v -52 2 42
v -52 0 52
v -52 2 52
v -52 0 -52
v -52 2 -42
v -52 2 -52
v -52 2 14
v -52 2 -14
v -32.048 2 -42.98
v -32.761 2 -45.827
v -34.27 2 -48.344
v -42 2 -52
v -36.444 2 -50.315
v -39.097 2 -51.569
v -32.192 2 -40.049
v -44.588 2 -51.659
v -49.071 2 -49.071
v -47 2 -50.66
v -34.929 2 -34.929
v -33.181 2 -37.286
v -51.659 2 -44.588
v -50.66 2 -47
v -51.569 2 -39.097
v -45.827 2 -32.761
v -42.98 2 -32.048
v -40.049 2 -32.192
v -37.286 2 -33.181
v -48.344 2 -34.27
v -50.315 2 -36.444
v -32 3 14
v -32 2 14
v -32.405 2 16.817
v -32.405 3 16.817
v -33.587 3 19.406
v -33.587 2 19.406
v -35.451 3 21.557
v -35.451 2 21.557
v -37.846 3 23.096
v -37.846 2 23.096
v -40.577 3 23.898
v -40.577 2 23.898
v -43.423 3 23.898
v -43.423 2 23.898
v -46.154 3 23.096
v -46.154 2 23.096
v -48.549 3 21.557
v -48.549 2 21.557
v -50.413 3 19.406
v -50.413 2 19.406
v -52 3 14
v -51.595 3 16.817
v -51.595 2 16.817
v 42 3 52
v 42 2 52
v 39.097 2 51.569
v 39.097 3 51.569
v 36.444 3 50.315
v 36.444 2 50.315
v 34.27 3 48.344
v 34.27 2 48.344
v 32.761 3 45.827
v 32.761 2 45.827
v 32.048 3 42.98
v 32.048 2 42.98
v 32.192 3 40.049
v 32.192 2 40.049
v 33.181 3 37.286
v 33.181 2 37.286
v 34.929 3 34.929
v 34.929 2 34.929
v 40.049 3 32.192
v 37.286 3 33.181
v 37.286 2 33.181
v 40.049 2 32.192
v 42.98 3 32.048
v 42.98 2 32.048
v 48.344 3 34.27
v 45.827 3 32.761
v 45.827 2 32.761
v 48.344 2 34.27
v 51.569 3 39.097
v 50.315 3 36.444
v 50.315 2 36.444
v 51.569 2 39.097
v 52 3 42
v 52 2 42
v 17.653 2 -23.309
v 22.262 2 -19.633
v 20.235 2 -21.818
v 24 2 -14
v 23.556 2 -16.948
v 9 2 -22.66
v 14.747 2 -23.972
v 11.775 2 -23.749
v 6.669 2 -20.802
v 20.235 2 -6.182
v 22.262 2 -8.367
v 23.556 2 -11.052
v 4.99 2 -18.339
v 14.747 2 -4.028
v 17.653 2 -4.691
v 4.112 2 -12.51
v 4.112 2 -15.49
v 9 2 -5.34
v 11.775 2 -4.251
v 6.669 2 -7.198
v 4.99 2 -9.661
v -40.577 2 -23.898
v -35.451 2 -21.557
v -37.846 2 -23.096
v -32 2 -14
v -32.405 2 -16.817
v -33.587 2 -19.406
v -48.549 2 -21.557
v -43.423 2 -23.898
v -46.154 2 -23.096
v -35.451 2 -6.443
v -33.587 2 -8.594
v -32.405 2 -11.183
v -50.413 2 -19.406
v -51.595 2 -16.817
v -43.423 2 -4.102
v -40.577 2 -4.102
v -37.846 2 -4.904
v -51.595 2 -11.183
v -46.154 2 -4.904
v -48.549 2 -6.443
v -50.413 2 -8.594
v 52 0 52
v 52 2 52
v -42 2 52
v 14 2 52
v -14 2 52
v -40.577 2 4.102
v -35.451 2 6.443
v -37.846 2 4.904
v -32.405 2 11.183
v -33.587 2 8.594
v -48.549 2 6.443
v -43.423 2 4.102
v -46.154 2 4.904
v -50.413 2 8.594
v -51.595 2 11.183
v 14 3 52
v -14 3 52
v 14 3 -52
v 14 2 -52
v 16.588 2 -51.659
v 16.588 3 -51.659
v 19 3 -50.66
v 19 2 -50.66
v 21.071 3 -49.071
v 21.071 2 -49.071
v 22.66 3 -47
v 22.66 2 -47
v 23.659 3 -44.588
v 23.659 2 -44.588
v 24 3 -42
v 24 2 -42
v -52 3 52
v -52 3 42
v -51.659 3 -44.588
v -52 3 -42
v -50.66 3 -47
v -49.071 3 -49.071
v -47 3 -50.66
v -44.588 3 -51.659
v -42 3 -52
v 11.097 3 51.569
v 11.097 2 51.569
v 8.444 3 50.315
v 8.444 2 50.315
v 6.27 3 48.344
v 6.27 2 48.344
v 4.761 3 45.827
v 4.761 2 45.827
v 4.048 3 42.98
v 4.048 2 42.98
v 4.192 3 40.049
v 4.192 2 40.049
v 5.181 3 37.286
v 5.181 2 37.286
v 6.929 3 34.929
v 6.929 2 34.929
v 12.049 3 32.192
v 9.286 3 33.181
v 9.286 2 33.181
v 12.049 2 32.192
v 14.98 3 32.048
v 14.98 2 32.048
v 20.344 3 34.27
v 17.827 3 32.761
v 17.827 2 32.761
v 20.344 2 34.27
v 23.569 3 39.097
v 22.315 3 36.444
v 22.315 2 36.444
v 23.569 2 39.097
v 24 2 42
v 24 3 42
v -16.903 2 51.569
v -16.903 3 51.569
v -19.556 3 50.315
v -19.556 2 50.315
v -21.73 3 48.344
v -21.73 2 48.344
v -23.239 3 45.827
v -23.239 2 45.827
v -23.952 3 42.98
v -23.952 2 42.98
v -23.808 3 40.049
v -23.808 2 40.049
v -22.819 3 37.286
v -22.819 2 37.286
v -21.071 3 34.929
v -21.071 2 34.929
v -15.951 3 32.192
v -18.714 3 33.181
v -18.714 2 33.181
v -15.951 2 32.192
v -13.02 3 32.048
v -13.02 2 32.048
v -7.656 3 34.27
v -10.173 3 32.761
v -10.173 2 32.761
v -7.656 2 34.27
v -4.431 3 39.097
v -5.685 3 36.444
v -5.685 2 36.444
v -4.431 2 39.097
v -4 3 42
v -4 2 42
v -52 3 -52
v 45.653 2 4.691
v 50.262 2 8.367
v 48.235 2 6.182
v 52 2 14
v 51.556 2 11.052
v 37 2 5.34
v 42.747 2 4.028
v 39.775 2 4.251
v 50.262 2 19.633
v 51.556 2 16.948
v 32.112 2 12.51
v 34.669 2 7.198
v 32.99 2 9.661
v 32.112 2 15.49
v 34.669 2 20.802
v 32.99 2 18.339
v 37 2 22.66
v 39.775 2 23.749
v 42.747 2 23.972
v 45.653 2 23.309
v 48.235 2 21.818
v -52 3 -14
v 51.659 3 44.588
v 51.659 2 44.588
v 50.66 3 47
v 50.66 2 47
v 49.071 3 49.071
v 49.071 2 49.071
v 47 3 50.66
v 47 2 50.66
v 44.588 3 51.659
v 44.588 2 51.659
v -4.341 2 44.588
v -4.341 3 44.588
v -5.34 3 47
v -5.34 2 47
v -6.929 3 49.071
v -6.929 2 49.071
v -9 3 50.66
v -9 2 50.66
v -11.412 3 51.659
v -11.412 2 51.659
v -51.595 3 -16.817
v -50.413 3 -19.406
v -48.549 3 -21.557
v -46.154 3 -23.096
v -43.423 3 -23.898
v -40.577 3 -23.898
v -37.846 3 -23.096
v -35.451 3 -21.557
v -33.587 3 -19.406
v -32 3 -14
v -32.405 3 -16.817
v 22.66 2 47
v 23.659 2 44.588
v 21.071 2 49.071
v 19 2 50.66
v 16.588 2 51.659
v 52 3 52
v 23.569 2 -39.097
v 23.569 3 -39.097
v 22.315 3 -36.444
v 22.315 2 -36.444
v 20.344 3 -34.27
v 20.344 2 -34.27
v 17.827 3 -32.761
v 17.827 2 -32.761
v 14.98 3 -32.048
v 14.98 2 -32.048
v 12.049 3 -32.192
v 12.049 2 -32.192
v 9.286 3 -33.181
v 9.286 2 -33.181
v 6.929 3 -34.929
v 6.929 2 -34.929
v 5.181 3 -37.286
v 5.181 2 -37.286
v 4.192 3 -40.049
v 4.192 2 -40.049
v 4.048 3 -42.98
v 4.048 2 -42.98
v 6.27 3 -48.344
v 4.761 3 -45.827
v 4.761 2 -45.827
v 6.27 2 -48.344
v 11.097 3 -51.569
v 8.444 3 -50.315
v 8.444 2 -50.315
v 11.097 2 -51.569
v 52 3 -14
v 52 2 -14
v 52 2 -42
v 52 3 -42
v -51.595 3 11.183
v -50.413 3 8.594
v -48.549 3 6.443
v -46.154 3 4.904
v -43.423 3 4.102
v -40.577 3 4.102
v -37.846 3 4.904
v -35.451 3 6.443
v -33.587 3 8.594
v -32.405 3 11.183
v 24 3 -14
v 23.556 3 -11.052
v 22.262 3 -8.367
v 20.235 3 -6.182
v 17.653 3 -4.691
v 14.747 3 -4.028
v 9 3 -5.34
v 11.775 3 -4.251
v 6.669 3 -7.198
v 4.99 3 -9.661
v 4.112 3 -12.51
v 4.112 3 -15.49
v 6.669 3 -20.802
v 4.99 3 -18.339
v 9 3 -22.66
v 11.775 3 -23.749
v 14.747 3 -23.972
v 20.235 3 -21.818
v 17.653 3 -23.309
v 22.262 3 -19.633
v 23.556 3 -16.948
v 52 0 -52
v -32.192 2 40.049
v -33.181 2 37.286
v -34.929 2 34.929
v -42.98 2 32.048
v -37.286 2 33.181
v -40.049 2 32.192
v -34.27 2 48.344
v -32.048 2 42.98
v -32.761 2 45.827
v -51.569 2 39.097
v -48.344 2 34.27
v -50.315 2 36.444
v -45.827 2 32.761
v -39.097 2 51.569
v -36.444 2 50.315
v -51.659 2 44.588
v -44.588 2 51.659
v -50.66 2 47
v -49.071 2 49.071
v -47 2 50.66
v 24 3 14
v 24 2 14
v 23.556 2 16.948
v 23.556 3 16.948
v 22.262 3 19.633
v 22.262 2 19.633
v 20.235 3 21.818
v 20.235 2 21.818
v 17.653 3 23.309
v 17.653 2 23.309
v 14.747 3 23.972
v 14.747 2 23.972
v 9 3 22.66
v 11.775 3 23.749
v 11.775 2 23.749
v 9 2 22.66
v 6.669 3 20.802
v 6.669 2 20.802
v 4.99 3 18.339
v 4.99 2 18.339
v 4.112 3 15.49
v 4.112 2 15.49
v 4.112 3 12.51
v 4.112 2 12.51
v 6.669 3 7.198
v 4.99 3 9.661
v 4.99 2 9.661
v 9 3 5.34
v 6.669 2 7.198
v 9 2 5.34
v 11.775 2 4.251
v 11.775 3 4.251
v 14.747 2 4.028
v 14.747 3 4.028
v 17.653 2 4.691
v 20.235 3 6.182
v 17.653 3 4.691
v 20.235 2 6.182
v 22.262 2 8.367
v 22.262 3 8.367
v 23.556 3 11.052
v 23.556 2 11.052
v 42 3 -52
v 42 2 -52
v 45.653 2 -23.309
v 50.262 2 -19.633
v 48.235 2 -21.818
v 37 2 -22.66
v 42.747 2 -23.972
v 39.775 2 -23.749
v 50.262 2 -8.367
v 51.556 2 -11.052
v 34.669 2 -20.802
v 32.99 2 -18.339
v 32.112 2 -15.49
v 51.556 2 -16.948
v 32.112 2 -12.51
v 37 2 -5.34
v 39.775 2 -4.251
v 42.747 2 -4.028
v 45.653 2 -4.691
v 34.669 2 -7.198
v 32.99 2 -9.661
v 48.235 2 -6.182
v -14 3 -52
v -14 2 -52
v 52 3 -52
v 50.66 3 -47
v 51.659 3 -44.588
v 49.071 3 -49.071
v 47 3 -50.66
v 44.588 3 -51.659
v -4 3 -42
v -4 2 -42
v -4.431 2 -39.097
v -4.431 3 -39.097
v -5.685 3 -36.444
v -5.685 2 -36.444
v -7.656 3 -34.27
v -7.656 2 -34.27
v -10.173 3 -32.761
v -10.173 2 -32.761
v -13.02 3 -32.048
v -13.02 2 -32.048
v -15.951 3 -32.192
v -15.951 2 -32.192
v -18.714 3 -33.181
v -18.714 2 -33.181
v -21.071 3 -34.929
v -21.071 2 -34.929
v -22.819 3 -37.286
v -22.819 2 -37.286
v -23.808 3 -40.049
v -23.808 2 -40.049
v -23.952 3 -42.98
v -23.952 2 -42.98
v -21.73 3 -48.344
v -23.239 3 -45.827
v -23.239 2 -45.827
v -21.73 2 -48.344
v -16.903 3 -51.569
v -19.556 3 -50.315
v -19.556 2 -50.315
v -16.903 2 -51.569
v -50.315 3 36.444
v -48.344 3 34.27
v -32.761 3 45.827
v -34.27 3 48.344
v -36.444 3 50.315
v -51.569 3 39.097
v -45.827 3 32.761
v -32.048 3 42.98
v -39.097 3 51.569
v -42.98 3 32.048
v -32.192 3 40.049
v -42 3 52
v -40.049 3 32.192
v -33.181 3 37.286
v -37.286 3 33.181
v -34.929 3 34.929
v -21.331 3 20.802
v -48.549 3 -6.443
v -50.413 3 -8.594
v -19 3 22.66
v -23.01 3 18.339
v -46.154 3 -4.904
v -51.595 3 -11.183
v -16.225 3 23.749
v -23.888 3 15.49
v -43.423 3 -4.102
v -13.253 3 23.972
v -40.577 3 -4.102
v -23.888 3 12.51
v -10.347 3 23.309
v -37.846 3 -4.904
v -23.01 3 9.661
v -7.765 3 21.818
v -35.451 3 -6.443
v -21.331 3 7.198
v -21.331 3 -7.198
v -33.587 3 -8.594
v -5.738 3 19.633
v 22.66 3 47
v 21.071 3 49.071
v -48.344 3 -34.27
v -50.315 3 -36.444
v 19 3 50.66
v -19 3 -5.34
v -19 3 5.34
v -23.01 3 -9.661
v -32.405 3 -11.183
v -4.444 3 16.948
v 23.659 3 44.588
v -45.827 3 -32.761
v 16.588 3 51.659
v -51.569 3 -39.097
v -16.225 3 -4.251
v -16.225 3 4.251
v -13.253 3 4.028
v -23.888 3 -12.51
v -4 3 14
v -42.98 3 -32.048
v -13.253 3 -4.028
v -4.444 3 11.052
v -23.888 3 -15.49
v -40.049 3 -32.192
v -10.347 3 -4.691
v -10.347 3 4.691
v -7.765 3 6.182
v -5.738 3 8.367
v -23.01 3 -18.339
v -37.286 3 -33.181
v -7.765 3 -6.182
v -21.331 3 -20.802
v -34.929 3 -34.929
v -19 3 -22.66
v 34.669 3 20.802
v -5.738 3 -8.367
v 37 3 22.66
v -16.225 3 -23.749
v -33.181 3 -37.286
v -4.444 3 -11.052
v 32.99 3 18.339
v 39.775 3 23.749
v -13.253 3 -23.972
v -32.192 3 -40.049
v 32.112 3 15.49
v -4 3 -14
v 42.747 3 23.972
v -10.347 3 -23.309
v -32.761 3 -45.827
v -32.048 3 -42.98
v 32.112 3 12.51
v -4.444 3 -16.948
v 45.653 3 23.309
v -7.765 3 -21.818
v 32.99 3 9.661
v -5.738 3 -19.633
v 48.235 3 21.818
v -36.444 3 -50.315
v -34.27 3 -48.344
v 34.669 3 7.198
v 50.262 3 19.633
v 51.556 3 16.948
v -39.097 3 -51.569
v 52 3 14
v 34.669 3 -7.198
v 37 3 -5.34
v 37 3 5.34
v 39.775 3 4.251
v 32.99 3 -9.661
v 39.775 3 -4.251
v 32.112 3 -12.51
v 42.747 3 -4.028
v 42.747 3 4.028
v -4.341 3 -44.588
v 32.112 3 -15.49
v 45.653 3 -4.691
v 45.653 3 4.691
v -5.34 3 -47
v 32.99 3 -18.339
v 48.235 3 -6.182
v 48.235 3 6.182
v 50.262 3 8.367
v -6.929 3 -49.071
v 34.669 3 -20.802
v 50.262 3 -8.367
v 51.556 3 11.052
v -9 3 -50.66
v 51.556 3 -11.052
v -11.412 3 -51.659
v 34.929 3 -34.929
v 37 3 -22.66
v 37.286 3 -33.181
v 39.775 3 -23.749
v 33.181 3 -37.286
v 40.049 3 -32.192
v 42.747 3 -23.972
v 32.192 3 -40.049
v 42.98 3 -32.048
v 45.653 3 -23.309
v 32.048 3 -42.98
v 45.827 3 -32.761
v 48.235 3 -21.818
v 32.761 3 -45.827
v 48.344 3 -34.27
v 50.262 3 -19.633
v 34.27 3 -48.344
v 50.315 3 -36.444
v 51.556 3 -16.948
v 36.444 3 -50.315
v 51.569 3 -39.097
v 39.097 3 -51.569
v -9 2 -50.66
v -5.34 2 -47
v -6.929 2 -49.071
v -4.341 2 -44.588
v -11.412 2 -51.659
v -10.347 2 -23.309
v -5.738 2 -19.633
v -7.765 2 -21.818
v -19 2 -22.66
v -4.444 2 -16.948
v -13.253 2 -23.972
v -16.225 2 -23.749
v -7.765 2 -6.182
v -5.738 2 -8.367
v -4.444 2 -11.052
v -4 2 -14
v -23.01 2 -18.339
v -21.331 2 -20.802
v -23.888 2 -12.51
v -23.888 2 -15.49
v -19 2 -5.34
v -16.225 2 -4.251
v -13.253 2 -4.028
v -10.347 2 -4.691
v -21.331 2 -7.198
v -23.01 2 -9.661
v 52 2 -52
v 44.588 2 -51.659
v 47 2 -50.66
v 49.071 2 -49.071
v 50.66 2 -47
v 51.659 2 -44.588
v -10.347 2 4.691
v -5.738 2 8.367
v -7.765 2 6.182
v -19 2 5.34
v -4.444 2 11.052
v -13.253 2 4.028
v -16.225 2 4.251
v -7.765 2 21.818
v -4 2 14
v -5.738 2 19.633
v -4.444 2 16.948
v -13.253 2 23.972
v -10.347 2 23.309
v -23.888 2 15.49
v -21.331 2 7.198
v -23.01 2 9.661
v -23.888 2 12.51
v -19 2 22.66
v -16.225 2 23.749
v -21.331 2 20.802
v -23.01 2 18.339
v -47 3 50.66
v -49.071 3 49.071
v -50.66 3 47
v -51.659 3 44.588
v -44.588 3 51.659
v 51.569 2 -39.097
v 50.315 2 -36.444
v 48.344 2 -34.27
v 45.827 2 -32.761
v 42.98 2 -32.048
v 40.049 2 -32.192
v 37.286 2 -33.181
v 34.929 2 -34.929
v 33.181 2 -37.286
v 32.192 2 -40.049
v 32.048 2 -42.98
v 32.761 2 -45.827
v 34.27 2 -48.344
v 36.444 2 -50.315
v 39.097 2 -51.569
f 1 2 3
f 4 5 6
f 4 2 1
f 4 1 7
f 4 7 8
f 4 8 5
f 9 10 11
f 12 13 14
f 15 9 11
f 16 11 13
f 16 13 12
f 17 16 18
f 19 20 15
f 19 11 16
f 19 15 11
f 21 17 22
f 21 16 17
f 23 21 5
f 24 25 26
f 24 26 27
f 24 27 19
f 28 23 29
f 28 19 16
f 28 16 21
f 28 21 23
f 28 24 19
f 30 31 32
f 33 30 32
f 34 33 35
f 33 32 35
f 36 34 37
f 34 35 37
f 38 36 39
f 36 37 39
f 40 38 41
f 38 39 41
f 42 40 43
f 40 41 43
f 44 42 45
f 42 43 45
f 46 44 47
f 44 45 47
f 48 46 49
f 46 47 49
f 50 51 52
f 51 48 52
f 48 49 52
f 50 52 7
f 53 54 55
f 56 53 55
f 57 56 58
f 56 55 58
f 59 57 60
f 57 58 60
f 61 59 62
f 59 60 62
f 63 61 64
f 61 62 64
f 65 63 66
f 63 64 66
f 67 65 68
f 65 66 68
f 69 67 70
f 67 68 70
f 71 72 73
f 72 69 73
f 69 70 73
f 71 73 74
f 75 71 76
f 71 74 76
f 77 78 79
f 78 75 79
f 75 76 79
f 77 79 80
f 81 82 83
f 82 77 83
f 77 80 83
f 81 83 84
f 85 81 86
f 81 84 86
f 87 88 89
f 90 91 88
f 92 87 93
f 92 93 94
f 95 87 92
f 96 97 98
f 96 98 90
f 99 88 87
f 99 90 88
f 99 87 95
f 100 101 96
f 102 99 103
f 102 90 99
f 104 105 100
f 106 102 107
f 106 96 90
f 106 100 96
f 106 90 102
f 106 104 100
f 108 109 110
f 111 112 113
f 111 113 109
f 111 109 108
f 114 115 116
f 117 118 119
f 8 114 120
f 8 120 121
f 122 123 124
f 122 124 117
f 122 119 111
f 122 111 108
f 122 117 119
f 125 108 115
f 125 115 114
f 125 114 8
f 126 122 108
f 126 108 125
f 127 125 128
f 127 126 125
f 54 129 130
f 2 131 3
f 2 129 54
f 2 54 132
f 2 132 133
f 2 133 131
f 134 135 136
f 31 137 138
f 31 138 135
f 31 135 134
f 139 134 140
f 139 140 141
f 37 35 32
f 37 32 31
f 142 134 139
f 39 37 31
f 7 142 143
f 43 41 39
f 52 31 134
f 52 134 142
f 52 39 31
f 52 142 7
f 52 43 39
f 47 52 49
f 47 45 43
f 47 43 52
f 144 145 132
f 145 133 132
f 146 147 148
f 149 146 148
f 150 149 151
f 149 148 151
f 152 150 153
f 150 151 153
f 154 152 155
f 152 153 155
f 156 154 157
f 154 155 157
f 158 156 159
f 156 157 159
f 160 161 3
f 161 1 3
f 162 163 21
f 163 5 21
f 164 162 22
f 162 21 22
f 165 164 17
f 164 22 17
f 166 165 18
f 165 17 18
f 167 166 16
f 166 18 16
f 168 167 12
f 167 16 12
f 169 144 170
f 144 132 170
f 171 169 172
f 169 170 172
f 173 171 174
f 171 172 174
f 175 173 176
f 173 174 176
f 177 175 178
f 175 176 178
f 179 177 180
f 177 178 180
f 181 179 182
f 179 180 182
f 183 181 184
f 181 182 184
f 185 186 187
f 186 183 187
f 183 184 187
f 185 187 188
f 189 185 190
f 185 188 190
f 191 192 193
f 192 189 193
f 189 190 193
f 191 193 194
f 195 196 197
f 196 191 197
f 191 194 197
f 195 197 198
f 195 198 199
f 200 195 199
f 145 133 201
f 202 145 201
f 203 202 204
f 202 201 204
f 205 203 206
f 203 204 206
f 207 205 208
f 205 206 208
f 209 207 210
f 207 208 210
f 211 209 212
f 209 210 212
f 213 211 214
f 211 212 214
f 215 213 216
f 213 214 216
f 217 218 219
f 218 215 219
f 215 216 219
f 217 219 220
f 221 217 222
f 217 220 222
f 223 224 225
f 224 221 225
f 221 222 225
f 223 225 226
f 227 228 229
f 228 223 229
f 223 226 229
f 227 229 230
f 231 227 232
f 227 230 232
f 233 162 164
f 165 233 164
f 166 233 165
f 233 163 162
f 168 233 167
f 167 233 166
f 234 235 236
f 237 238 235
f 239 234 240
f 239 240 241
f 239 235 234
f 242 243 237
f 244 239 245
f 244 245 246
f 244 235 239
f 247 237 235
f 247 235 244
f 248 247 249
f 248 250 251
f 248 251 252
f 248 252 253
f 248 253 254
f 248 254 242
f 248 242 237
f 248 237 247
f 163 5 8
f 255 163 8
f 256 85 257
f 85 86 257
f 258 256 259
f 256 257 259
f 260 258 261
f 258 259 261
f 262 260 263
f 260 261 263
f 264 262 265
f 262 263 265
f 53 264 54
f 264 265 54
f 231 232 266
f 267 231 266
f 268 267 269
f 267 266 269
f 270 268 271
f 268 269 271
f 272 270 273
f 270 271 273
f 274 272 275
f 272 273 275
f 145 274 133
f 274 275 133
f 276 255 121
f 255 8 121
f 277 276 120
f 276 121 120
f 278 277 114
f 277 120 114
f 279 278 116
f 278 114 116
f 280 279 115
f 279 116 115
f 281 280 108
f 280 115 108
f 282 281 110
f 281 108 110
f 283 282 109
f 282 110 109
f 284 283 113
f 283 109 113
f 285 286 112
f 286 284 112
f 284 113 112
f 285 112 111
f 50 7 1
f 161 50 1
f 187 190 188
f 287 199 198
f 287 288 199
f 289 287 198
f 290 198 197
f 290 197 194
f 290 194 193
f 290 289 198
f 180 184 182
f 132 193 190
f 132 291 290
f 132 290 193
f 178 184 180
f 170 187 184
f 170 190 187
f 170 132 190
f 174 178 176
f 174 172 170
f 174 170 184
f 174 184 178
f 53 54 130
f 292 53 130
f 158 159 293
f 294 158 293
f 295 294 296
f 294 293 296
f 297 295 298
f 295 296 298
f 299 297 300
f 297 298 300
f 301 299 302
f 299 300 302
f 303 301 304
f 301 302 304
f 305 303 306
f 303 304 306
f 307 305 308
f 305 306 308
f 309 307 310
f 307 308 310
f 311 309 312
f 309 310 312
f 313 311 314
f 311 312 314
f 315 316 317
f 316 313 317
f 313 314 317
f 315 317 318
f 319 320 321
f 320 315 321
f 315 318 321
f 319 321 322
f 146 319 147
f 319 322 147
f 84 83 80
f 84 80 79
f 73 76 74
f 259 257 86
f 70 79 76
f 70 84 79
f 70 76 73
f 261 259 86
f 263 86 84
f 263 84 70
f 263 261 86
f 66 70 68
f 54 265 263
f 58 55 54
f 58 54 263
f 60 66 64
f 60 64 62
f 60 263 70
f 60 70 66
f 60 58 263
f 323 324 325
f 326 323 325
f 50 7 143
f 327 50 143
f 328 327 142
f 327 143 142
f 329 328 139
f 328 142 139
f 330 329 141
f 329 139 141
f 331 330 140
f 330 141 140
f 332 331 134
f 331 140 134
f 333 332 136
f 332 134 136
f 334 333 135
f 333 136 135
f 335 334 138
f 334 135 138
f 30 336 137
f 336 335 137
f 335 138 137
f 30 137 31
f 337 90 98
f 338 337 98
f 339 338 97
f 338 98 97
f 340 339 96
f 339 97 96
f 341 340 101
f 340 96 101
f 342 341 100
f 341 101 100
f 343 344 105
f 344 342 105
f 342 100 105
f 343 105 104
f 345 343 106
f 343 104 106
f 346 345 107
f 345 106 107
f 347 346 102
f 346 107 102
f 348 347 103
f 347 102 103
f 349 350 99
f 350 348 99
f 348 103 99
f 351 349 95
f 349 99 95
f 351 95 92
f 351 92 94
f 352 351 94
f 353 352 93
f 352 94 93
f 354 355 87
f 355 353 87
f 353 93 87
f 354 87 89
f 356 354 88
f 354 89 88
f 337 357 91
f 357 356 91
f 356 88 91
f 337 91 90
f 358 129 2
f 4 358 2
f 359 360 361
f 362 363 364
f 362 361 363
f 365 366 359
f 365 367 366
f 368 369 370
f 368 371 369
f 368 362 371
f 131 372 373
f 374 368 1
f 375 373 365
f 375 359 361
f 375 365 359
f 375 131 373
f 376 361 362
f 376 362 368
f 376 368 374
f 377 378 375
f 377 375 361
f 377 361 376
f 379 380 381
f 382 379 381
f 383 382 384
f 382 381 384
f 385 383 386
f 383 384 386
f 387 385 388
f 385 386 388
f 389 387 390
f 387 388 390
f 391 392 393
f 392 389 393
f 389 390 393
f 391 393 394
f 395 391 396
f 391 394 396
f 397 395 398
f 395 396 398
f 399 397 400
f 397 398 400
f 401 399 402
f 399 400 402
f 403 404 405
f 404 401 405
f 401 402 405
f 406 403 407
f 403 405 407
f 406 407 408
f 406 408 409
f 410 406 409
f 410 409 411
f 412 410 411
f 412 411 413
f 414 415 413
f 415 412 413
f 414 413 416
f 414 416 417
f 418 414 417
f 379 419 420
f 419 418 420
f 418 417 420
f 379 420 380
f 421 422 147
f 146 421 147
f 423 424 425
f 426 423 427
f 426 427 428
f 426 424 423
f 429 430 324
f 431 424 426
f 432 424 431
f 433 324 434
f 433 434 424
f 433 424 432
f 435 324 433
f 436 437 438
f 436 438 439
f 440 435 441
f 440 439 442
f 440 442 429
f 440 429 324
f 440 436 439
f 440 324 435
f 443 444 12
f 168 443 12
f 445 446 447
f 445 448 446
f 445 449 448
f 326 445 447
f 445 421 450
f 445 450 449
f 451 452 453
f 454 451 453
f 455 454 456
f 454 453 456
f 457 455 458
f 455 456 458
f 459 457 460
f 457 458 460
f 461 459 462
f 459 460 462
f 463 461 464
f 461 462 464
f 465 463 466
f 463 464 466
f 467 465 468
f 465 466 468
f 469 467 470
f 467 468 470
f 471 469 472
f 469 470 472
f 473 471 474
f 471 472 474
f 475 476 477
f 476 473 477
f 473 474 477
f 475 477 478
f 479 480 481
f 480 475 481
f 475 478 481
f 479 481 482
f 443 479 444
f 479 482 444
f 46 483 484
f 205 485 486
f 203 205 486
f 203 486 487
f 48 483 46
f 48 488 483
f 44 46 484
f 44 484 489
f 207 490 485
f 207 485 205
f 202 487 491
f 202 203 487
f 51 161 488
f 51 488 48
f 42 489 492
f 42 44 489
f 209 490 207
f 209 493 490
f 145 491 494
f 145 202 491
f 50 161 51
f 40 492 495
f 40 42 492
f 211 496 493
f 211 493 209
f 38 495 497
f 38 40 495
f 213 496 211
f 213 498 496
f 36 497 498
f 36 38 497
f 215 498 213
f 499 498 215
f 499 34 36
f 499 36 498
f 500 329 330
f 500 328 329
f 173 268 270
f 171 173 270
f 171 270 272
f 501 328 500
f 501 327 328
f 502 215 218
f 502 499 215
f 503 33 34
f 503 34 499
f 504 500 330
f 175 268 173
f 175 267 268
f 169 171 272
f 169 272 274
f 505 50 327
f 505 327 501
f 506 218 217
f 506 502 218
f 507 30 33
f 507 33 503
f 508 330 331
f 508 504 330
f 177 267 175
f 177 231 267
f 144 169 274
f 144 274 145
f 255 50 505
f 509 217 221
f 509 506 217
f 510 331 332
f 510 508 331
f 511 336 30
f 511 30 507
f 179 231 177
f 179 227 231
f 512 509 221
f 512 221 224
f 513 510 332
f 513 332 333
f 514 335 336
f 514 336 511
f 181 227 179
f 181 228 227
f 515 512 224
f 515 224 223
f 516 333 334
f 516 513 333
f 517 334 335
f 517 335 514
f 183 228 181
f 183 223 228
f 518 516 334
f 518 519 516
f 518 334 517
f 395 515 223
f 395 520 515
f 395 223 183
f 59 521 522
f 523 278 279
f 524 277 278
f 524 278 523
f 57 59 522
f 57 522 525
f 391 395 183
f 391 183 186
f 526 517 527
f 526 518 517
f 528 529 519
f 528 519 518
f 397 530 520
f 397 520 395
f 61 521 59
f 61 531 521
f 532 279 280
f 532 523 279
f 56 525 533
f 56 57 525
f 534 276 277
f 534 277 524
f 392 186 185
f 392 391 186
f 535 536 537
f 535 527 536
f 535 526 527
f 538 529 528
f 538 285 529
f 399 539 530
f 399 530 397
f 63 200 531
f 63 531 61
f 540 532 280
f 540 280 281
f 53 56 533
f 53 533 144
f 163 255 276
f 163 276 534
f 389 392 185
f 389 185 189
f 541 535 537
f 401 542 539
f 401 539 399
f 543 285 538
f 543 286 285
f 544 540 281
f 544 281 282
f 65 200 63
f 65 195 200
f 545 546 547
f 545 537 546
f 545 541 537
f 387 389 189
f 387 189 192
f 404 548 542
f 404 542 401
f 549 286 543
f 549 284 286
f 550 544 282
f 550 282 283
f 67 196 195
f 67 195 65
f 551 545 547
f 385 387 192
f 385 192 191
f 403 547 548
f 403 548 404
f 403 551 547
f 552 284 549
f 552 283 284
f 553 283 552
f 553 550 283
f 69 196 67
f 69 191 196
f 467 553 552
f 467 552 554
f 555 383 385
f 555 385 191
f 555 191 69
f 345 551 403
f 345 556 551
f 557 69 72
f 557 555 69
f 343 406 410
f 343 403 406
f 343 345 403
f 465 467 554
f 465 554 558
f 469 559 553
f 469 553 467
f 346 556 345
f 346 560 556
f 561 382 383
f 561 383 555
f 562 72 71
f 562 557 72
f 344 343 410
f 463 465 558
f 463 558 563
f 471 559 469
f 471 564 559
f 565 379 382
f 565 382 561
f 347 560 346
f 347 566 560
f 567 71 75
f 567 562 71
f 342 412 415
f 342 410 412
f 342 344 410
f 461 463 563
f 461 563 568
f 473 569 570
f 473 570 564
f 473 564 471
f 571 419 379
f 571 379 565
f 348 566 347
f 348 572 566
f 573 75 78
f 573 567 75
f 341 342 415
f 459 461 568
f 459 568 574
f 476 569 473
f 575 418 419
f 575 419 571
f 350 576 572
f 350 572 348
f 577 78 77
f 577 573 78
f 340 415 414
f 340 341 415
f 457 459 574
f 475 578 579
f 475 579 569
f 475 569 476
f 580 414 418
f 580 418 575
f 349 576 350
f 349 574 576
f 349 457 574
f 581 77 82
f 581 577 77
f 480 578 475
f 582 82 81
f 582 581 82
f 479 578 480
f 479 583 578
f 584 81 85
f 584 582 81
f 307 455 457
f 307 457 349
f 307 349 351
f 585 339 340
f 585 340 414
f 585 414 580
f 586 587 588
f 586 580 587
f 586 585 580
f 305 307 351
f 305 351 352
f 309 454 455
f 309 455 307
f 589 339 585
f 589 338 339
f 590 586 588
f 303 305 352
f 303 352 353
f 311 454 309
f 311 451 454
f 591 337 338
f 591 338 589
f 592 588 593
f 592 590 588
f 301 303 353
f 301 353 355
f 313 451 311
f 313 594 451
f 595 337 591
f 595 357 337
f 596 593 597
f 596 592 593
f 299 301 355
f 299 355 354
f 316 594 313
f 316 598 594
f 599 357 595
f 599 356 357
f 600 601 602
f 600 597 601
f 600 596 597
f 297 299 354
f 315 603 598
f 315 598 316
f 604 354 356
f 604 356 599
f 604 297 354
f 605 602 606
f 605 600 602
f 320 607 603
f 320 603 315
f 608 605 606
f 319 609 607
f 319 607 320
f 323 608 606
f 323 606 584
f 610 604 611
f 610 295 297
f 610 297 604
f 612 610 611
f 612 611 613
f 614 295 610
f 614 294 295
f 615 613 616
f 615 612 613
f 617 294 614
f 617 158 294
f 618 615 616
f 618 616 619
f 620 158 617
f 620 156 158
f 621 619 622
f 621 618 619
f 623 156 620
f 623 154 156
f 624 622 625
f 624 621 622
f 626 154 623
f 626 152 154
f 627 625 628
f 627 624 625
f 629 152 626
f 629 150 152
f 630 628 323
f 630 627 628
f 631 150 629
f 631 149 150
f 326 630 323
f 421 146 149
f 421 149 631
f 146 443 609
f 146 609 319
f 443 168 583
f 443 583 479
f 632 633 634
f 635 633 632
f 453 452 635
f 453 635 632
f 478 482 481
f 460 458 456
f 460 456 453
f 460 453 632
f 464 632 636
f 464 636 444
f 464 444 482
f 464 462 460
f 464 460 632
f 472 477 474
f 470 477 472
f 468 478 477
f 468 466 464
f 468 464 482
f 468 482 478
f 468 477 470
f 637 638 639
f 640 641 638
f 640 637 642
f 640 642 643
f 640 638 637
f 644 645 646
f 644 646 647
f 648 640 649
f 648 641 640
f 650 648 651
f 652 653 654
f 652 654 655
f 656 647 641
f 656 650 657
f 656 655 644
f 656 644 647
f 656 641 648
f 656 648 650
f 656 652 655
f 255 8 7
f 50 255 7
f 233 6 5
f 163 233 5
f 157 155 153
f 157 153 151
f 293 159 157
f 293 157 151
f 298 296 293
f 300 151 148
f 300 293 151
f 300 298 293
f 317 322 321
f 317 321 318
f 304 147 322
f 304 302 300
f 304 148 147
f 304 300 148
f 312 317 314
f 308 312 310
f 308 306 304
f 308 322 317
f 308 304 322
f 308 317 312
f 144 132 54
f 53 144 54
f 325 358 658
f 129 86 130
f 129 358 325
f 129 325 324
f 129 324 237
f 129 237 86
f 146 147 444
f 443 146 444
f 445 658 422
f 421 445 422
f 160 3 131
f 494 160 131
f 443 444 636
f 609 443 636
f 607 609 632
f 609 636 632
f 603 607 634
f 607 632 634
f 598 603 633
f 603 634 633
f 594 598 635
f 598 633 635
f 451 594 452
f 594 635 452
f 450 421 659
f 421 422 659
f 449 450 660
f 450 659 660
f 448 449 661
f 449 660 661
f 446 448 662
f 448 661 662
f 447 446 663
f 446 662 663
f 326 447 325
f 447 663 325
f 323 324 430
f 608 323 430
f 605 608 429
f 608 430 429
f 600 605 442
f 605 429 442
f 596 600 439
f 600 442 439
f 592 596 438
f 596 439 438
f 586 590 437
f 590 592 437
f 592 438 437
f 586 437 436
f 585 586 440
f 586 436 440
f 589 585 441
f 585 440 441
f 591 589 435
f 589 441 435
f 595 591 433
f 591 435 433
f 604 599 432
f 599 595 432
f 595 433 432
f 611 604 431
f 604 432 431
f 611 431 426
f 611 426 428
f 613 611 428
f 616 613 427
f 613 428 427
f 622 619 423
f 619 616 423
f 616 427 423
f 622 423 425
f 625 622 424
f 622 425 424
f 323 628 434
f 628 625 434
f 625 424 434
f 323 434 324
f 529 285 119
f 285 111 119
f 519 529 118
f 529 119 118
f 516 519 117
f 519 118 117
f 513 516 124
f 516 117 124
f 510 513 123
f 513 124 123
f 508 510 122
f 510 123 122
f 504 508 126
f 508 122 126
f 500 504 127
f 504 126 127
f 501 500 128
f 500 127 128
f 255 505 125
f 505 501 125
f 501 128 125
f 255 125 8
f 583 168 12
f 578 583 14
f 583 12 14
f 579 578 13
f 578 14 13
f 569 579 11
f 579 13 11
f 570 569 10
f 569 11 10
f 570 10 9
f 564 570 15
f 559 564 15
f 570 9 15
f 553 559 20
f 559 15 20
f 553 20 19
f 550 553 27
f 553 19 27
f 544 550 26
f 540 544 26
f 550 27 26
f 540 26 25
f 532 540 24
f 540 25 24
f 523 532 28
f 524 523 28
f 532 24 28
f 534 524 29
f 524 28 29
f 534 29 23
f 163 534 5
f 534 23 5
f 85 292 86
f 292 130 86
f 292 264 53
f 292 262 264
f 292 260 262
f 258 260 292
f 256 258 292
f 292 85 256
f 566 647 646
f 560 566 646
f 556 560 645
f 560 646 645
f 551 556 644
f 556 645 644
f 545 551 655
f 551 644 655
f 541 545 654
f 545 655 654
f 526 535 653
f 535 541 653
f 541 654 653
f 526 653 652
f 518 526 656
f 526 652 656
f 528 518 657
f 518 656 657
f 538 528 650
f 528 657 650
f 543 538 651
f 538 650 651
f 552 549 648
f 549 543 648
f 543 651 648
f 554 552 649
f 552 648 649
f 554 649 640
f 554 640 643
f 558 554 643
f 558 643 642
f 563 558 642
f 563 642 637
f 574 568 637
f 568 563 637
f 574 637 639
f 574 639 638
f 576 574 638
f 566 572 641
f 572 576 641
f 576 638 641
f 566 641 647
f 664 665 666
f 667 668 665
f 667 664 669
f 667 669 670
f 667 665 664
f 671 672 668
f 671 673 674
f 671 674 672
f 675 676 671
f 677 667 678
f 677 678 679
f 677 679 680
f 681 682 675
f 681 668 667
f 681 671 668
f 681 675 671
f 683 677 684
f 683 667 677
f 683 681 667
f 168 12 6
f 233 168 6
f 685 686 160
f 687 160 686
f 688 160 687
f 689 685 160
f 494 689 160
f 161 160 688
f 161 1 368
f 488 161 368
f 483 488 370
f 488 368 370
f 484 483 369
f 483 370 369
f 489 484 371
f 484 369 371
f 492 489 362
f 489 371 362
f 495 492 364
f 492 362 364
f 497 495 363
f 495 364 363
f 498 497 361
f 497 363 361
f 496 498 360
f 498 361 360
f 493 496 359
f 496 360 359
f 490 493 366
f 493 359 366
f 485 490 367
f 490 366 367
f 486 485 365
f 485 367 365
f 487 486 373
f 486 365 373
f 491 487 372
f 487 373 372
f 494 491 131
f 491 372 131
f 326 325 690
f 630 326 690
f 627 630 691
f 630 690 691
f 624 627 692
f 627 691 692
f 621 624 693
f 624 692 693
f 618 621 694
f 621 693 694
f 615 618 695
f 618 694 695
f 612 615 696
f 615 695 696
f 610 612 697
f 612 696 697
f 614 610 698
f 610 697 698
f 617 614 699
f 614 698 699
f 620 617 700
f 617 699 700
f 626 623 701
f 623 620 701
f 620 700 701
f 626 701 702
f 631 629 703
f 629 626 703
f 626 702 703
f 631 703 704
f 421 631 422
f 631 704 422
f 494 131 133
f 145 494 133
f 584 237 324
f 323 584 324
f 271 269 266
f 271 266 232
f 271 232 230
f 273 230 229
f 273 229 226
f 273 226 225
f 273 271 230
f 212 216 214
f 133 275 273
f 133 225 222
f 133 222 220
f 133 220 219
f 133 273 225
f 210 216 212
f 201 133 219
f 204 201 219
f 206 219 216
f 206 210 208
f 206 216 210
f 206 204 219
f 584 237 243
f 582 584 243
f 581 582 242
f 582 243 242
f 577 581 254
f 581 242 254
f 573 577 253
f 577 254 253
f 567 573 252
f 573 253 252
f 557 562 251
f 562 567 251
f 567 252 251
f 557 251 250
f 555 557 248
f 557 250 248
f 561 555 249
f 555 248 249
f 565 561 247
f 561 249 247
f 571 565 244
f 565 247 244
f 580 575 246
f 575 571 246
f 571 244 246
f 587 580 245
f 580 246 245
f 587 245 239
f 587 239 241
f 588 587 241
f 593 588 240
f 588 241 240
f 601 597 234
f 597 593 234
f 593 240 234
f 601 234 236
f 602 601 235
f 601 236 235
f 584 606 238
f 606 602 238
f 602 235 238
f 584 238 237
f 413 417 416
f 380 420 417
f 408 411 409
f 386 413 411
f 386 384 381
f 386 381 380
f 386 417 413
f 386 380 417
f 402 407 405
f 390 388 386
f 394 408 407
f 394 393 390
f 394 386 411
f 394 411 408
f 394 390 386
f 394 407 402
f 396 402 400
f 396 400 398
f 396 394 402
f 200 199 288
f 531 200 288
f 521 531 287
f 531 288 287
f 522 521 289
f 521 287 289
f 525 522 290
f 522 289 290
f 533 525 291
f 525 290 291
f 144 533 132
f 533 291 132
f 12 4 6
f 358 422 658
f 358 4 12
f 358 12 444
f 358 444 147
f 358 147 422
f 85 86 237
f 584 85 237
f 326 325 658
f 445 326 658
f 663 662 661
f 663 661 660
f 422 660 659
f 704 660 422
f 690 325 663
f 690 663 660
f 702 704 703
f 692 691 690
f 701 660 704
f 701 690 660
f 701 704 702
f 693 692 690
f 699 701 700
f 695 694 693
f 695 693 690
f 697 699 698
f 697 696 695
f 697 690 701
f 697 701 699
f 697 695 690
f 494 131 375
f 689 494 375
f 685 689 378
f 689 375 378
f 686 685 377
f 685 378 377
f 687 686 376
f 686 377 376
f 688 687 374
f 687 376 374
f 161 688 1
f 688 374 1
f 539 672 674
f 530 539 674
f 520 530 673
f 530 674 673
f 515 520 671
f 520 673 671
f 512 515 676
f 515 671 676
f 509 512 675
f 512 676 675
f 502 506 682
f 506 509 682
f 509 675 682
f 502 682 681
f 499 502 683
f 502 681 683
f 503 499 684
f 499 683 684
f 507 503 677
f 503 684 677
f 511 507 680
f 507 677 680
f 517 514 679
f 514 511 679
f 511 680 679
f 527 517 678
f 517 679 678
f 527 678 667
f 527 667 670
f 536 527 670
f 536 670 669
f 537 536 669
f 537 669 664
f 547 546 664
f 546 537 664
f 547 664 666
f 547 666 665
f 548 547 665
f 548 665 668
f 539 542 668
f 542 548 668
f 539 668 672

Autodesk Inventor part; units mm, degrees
ref_plane "YZ Plane" through (0, 0, 0) normal (1, 0, 0) x (0, 1, 0)
ref_plane "XZ Plane" through (0, 0, 0) normal (0, 1, 0) x (-1, 0, 0)
ref_plane "XY Plane" through (0, 0, 0) normal (0, 0, 1) x (1, 0, 0)
sketch "スケッチ1" plane through (0, 0, 0) normal (0, 1, 0) x (-1, 0, 0)
  line L0 (-52, 52) -> (52, 52)
  line L1 (52, 52) -> (52, -52)
  line L2 (52, -52) -> (-52, -52)
  line L3 (-52, -52) -> (-52, 52)
  point P0 (0, 0)
  dimension "d0" = 104
  dimension "d2" = 104
  dimension "d3" = 52
  dimension "d4" = 52
extrude "押し出し1" add sketch "スケッチ1" along normal blind 2
sketch "スケッチ2" plane through (0, 2, 0) normal (0, 1, 0) x (1, 0, 0)
  line L0 (-52, -52) -> (52, -52) projected
  line L1 (52, -52) -> (52, 52) projected
  line L2 (52, 52) -> (-52, 52) projected
  line L3 (-52, 52) -> (-52, -52) projected
  circle A0 centre (-42, -42) radius 10
  circle A1 centre (-14, -42) radius 10
  circle A2 centre (14, -42) radius 10
  circle A3 centre (-42, -14) radius 10
  circle A4 centre (-14, -14) radius 10
  circle A5 centre (14, -14) radius 10
  circle A6 centre (-42, 14) radius 10
  circle A7 centre (-14, 14) radius 10
  circle A8 centre (14, 14) radius 10
  circle A9 centre (42, -42) radius 10
  circle A10 centre (42, -14) radius 10
  circle A11 centre (42, 14) radius 10
  circle A12 centre (42, 42) radius 10
  circle A13 centre (14, 42) radius 10
  circle A14 centre (-14, 42) radius 10
  circle A15 centre (-42, 42) radius 10
  point P0 (0, 0)
  dimension "d7" = 20
  dimension "d43" = 28
  dimension "d44" = 28
  dimension "d45" = 28
  dimension "d46" = 10
  dimension "d47" = 10
  dimension "d48" = 10
  dimension "d49" = 10
  dimension "d50" = 10
  dimension "d51" = 10
  dimension "d52" = 28
  dimension "d53" = 28
  dimension "d54" = 28
  dimension "d55" = 28
  dimension "d56" = 28
  dimension "d57" = 28
  dimension "d58" = 28
  dimension "d59" = 28
  dimension "d60" = 28
  dimension "d61" = 28
  dimension "d62" = 28
  dimension "d63" = 10
  dimension "d64" = 10
  dimension "d65" = 28
  dimension "d66" = 28
  dimension "d67" = 28
  dimension "d68" = 28
  dimension "d69" = 28
  dimension "d70" = 28
  dimension "d71" = 28
  dimension "d72" = 28
  dimension "d73" = 28
  dimension "d74" = 28
extrude "押し出し2" add sketch "スケッチ2" along normal blind 1 contours L3 A0 L0 | A0 L3 A15 L2 A12 L1 A9 L0 | A9 L1 L0 | L3 L2 A15 | A12 L2 L1
properties part number "fai20_sikiita"
